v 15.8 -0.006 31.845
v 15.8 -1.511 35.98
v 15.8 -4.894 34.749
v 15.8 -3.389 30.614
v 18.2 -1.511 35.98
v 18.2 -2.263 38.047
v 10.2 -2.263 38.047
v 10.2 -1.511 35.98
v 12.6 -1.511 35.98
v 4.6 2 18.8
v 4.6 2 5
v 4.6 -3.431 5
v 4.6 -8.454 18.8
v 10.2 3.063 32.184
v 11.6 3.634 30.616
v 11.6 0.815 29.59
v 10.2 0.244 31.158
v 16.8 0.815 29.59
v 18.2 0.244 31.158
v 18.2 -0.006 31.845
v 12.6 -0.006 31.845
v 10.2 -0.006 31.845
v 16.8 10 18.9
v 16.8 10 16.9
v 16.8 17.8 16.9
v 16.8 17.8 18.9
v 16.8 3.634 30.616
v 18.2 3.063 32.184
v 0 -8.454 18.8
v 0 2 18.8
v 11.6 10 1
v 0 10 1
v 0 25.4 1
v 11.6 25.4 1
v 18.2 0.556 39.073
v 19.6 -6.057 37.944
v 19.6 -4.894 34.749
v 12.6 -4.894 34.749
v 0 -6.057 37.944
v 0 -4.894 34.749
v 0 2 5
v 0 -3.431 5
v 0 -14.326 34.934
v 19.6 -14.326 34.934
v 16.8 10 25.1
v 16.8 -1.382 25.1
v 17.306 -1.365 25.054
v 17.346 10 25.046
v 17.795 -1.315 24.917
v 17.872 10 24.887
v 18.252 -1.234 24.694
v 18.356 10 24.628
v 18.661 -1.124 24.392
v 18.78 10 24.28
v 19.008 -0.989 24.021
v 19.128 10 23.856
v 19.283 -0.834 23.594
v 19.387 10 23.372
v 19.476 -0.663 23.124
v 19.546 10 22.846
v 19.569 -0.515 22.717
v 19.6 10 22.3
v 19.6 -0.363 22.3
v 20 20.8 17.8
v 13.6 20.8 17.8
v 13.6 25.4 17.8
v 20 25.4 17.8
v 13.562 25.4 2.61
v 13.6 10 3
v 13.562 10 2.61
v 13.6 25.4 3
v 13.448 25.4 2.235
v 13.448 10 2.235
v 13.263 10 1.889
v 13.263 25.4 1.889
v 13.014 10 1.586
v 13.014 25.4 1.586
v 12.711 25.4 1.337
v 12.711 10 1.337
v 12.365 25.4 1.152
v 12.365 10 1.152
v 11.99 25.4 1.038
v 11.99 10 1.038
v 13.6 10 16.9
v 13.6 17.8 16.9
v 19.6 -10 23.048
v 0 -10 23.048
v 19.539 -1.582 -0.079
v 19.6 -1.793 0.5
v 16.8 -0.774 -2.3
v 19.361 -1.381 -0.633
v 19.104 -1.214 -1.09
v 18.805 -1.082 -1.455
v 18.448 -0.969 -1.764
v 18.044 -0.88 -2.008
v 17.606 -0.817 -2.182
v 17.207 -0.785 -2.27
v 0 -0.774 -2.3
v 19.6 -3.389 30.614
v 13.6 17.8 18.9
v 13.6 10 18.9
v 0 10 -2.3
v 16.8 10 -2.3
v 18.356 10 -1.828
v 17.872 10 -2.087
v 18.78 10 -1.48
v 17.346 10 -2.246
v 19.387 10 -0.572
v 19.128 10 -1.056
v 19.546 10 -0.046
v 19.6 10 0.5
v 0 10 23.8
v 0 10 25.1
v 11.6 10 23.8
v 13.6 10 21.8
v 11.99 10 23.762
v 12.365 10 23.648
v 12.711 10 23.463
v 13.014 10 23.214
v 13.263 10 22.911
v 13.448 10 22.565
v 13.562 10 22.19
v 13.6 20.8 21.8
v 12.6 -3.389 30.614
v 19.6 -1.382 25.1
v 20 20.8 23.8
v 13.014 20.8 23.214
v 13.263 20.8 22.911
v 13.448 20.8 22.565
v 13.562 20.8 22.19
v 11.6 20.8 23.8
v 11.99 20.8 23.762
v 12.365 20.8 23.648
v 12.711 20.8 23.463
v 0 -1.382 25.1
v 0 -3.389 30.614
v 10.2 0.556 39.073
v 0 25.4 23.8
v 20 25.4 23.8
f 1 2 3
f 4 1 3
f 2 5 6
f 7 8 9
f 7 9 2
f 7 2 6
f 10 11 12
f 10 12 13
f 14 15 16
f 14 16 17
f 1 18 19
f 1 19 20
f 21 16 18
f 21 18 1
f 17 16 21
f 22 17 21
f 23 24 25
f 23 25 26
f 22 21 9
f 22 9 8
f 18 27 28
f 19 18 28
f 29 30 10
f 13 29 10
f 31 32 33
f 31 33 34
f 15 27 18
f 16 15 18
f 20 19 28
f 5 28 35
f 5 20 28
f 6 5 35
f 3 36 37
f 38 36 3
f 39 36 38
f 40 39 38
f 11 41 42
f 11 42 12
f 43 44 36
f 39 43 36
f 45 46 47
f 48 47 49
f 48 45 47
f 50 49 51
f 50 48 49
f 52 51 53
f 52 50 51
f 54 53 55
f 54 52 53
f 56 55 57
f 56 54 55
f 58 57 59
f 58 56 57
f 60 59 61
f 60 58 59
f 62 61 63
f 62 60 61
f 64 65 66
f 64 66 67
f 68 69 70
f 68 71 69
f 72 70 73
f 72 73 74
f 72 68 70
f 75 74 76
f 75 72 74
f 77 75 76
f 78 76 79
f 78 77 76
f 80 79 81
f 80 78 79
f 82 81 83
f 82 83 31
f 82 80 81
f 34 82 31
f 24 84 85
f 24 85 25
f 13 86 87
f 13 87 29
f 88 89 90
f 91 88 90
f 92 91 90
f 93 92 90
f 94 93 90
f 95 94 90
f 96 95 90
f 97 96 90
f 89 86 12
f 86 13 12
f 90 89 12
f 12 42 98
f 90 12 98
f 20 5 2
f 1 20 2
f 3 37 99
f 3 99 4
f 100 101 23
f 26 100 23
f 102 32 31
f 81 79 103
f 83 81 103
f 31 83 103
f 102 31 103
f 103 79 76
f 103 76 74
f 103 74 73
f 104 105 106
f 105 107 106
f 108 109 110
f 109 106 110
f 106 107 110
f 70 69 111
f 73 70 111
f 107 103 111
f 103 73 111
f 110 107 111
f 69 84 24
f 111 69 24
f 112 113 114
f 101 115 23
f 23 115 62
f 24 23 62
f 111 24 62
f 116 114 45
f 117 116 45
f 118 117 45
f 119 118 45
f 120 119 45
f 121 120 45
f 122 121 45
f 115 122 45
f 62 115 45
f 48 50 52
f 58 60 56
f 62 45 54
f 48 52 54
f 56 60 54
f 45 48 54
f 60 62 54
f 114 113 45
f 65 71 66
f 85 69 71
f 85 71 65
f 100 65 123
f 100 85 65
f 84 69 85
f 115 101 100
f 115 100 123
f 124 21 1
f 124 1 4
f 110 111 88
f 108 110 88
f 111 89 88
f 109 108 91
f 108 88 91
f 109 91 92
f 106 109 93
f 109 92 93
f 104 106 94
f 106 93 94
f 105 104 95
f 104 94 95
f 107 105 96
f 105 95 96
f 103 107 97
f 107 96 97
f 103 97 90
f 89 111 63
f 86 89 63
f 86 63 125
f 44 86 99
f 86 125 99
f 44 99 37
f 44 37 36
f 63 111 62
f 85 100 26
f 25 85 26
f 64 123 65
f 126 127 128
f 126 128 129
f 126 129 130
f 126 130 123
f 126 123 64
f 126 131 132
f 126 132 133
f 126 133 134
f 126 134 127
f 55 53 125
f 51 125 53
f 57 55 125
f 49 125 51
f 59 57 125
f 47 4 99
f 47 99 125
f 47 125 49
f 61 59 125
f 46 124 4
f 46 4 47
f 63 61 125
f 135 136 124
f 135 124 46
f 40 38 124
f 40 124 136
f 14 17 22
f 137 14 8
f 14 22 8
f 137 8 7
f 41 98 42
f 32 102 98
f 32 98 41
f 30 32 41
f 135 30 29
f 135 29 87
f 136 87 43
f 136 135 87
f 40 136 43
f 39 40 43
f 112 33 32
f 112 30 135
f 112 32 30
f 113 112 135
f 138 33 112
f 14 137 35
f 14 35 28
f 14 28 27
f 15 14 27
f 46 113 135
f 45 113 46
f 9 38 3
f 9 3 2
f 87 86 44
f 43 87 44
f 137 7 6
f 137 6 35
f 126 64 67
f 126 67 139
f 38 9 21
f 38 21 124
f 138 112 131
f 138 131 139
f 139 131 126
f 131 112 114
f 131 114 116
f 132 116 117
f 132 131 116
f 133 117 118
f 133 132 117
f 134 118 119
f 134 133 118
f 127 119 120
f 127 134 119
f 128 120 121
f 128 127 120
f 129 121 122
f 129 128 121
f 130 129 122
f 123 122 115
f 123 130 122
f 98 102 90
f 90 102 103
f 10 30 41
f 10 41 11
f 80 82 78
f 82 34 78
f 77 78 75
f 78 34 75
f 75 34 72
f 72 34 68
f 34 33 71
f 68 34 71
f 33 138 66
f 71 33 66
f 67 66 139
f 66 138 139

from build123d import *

# Parameters (mm, degrees)
SKETCH_W             = 13.6
SKETCH_H             = 22.8
PAD_DEPTH            = 25.4
SKETCH001_W          = 3.2
SKETCH001_H          = 2
PAD001_DEPTH         = 17.8
PAD002_START         = -20.8
SKETCH002_W          = 20
SKETCH002_H          = 6
PAD002_DEPTH         = 4.6
SKETCH003_W          = 4.6
SKETCH003_H          = 13.6
POCKET_DEPTH         = 3.6
SKETCH005_W          = 19.6
SKETCH005_H          = 27.4
PAD003_DEPTH         = 10
PAD003_DEPTH_BACK    = 10
PAD004_DEPTH         = 19.6
SKETCH008_W          = 12.6
SKETCH008_H          = 3.6
SKETCH008_W_2        = 3.8
POCKET001_DEPTH      = 4.4
POCKET002_DEPTH      = 6.6
POCKET003_DEPTH      = 19.6
SKETCH011_W          = 4.6
SKETCH011_H          = 13.8
POCKET004_DEPTH      = 10
POCKET004_DEPTH_BACK = 2
FILLET_R             = 2.8
FILLET001_R          = 2


with BuildPart() as part:
    # Sketch → Pad (new body)
    with BuildSketch(Plane.XZ):
        with Locations((6.8, 12.4)):
            Rectangle(SKETCH_W, SKETCH_H)
    extrude(amount=-PAD_DEPTH)

    # Sketch001 → Pad001 (join)
    with BuildSketch(Plane.XZ):
        with Locations((15.2, 17.9)):
            Rectangle(SKETCH001_W, SKETCH001_H)
    extrude(amount=-PAD001_DEPTH)

    # Sketch002 → Pad002 (join)
    with BuildSketch(Plane.XZ.offset(PAD002_START)):
        with Locations((10, 20.8)):
            Rectangle(SKETCH002_W, SKETCH002_H)
    extrude(amount=-PAD002_DEPTH)

    # Sketch003 → Pocket (cut)
    with BuildSketch(Plane.XZ):
        with Locations((2.3, 11.4)):
            Rectangle(SKETCH003_W, SKETCH003_H)
    extrude(amount=-POCKET_DEPTH, mode=Mode.SUBTRACT)

    # Sketch005 → Pad003 (join, two sides)
    with BuildSketch(Plane.XZ) as pad003_sk:
        with Locations((9.8, 11.4)):
            Rectangle(SKETCH005_W, SKETCH005_H)
    extrude(amount=-PAD003_DEPTH)
    extrude(pad003_sk.sketch, amount=PAD003_DEPTH_BACK)

    # Sketch007 → Pad004 (join)
    with BuildSketch(Plane.YZ):
        Polygon((-1.2, 24.6), (-9.4692950629, 21.5902227387), (-14.3259810981, 34.9338579539), (-6.0566860352, 37.9436352152), (-4.8938175479, 34.7486803045), (-1.5109241131, 35.9799528205), (-2.2633684284, 38.0472765862), (0.5557094339, 39.0733370162), (3.6338907239, 30.6161034291), (0.8148128615, 29.5900429991), (-0.0060354825, 31.845305289), (-3.3889289173, 30.614032773), align=None)
    extrude(amount=PAD004_DEPTH)

    # Sketch008 (on DatumPlane) → Pocket001 (cut)
    with BuildSketch(Plane(origin=(0, -11.7404784812, 32.2566995207), x_dir=(-1, 0, 0), z_dir=(0, -0.3420201433, 0.9396926208))):
        with Locations((-6.3, -9.0860643809)):
            Rectangle(SKETCH008_W, SKETCH008_H)
        with Locations((-17.7, -9.0860643809)):
            Rectangle(SKETCH008_W_2, SKETCH008_H)
    extrude(amount=-POCKET001_DEPTH, mode=Mode.SUBTRACT)

    # Sketch009 (on DatumPlane) → Pocket002 (cut)
    with BuildSketch(Plane(origin=(0, 6.8466609333, 2.4919807838), x_dir=(1, 0, 0), z_dir=(0, 0.9396926208, 0.3420201433))):
        Polygon((11.600006173, -27.5268626433), (10.2, -29.195323), (10.2, -36.526867), (0, -36.526867), (0, -27.5268626433), align=None)
        Polygon((16.7999894706, -27.5268626433), (18.2, -29.1953225959), (18.2, -36.526867), (19.6, -36.526867), (19.6, -27.5268626433), align=None)
    extrude(amount=POCKET002_DEPTH, mode=Mode.SUBTRACT)

    # Sketch010 → Pocket003 (cut)
    with BuildSketch(Plane.YZ):
        Polygon((-0.773965096, -2.3), (-14.3259810981, -2.3), (-14.3259810981, 34.9338579539), align=None)
    extrude(amount=POCKET003_DEPTH, mode=Mode.SUBTRACT)

    # Sketch011 → Pocket004 (cut, two sides)
    with BuildSketch(Plane.XZ) as pocket004_sk:
        with Locations((2.3, 11.9)):
            Rectangle(SKETCH011_W, SKETCH011_H)
    extrude(amount=POCKET004_DEPTH, mode=Mode.SUBTRACT)
    extrude(pocket004_sk.sketch, amount=-POCKET004_DEPTH_BACK, mode=Mode.SUBTRACT)

    # Fillet
    fillet_edges = [part.edges().sort_by_distance(p)[0] for p in [
        (19.6, 4.309007, 25.1),
        (19.6, 4.613017, -2.3),
    ]]
    fillet(fillet_edges, radius=FILLET_R)

    # Fillet001
    fillet001_edges = [part.edges().sort_by_distance(p)[0] for p in [
        (13.6, 15.4, 23.8),
        (13.6, 17.7, 1),
    ]]
    fillet(fillet001_edges, radius=FILLET001_R)


solid = part.part
